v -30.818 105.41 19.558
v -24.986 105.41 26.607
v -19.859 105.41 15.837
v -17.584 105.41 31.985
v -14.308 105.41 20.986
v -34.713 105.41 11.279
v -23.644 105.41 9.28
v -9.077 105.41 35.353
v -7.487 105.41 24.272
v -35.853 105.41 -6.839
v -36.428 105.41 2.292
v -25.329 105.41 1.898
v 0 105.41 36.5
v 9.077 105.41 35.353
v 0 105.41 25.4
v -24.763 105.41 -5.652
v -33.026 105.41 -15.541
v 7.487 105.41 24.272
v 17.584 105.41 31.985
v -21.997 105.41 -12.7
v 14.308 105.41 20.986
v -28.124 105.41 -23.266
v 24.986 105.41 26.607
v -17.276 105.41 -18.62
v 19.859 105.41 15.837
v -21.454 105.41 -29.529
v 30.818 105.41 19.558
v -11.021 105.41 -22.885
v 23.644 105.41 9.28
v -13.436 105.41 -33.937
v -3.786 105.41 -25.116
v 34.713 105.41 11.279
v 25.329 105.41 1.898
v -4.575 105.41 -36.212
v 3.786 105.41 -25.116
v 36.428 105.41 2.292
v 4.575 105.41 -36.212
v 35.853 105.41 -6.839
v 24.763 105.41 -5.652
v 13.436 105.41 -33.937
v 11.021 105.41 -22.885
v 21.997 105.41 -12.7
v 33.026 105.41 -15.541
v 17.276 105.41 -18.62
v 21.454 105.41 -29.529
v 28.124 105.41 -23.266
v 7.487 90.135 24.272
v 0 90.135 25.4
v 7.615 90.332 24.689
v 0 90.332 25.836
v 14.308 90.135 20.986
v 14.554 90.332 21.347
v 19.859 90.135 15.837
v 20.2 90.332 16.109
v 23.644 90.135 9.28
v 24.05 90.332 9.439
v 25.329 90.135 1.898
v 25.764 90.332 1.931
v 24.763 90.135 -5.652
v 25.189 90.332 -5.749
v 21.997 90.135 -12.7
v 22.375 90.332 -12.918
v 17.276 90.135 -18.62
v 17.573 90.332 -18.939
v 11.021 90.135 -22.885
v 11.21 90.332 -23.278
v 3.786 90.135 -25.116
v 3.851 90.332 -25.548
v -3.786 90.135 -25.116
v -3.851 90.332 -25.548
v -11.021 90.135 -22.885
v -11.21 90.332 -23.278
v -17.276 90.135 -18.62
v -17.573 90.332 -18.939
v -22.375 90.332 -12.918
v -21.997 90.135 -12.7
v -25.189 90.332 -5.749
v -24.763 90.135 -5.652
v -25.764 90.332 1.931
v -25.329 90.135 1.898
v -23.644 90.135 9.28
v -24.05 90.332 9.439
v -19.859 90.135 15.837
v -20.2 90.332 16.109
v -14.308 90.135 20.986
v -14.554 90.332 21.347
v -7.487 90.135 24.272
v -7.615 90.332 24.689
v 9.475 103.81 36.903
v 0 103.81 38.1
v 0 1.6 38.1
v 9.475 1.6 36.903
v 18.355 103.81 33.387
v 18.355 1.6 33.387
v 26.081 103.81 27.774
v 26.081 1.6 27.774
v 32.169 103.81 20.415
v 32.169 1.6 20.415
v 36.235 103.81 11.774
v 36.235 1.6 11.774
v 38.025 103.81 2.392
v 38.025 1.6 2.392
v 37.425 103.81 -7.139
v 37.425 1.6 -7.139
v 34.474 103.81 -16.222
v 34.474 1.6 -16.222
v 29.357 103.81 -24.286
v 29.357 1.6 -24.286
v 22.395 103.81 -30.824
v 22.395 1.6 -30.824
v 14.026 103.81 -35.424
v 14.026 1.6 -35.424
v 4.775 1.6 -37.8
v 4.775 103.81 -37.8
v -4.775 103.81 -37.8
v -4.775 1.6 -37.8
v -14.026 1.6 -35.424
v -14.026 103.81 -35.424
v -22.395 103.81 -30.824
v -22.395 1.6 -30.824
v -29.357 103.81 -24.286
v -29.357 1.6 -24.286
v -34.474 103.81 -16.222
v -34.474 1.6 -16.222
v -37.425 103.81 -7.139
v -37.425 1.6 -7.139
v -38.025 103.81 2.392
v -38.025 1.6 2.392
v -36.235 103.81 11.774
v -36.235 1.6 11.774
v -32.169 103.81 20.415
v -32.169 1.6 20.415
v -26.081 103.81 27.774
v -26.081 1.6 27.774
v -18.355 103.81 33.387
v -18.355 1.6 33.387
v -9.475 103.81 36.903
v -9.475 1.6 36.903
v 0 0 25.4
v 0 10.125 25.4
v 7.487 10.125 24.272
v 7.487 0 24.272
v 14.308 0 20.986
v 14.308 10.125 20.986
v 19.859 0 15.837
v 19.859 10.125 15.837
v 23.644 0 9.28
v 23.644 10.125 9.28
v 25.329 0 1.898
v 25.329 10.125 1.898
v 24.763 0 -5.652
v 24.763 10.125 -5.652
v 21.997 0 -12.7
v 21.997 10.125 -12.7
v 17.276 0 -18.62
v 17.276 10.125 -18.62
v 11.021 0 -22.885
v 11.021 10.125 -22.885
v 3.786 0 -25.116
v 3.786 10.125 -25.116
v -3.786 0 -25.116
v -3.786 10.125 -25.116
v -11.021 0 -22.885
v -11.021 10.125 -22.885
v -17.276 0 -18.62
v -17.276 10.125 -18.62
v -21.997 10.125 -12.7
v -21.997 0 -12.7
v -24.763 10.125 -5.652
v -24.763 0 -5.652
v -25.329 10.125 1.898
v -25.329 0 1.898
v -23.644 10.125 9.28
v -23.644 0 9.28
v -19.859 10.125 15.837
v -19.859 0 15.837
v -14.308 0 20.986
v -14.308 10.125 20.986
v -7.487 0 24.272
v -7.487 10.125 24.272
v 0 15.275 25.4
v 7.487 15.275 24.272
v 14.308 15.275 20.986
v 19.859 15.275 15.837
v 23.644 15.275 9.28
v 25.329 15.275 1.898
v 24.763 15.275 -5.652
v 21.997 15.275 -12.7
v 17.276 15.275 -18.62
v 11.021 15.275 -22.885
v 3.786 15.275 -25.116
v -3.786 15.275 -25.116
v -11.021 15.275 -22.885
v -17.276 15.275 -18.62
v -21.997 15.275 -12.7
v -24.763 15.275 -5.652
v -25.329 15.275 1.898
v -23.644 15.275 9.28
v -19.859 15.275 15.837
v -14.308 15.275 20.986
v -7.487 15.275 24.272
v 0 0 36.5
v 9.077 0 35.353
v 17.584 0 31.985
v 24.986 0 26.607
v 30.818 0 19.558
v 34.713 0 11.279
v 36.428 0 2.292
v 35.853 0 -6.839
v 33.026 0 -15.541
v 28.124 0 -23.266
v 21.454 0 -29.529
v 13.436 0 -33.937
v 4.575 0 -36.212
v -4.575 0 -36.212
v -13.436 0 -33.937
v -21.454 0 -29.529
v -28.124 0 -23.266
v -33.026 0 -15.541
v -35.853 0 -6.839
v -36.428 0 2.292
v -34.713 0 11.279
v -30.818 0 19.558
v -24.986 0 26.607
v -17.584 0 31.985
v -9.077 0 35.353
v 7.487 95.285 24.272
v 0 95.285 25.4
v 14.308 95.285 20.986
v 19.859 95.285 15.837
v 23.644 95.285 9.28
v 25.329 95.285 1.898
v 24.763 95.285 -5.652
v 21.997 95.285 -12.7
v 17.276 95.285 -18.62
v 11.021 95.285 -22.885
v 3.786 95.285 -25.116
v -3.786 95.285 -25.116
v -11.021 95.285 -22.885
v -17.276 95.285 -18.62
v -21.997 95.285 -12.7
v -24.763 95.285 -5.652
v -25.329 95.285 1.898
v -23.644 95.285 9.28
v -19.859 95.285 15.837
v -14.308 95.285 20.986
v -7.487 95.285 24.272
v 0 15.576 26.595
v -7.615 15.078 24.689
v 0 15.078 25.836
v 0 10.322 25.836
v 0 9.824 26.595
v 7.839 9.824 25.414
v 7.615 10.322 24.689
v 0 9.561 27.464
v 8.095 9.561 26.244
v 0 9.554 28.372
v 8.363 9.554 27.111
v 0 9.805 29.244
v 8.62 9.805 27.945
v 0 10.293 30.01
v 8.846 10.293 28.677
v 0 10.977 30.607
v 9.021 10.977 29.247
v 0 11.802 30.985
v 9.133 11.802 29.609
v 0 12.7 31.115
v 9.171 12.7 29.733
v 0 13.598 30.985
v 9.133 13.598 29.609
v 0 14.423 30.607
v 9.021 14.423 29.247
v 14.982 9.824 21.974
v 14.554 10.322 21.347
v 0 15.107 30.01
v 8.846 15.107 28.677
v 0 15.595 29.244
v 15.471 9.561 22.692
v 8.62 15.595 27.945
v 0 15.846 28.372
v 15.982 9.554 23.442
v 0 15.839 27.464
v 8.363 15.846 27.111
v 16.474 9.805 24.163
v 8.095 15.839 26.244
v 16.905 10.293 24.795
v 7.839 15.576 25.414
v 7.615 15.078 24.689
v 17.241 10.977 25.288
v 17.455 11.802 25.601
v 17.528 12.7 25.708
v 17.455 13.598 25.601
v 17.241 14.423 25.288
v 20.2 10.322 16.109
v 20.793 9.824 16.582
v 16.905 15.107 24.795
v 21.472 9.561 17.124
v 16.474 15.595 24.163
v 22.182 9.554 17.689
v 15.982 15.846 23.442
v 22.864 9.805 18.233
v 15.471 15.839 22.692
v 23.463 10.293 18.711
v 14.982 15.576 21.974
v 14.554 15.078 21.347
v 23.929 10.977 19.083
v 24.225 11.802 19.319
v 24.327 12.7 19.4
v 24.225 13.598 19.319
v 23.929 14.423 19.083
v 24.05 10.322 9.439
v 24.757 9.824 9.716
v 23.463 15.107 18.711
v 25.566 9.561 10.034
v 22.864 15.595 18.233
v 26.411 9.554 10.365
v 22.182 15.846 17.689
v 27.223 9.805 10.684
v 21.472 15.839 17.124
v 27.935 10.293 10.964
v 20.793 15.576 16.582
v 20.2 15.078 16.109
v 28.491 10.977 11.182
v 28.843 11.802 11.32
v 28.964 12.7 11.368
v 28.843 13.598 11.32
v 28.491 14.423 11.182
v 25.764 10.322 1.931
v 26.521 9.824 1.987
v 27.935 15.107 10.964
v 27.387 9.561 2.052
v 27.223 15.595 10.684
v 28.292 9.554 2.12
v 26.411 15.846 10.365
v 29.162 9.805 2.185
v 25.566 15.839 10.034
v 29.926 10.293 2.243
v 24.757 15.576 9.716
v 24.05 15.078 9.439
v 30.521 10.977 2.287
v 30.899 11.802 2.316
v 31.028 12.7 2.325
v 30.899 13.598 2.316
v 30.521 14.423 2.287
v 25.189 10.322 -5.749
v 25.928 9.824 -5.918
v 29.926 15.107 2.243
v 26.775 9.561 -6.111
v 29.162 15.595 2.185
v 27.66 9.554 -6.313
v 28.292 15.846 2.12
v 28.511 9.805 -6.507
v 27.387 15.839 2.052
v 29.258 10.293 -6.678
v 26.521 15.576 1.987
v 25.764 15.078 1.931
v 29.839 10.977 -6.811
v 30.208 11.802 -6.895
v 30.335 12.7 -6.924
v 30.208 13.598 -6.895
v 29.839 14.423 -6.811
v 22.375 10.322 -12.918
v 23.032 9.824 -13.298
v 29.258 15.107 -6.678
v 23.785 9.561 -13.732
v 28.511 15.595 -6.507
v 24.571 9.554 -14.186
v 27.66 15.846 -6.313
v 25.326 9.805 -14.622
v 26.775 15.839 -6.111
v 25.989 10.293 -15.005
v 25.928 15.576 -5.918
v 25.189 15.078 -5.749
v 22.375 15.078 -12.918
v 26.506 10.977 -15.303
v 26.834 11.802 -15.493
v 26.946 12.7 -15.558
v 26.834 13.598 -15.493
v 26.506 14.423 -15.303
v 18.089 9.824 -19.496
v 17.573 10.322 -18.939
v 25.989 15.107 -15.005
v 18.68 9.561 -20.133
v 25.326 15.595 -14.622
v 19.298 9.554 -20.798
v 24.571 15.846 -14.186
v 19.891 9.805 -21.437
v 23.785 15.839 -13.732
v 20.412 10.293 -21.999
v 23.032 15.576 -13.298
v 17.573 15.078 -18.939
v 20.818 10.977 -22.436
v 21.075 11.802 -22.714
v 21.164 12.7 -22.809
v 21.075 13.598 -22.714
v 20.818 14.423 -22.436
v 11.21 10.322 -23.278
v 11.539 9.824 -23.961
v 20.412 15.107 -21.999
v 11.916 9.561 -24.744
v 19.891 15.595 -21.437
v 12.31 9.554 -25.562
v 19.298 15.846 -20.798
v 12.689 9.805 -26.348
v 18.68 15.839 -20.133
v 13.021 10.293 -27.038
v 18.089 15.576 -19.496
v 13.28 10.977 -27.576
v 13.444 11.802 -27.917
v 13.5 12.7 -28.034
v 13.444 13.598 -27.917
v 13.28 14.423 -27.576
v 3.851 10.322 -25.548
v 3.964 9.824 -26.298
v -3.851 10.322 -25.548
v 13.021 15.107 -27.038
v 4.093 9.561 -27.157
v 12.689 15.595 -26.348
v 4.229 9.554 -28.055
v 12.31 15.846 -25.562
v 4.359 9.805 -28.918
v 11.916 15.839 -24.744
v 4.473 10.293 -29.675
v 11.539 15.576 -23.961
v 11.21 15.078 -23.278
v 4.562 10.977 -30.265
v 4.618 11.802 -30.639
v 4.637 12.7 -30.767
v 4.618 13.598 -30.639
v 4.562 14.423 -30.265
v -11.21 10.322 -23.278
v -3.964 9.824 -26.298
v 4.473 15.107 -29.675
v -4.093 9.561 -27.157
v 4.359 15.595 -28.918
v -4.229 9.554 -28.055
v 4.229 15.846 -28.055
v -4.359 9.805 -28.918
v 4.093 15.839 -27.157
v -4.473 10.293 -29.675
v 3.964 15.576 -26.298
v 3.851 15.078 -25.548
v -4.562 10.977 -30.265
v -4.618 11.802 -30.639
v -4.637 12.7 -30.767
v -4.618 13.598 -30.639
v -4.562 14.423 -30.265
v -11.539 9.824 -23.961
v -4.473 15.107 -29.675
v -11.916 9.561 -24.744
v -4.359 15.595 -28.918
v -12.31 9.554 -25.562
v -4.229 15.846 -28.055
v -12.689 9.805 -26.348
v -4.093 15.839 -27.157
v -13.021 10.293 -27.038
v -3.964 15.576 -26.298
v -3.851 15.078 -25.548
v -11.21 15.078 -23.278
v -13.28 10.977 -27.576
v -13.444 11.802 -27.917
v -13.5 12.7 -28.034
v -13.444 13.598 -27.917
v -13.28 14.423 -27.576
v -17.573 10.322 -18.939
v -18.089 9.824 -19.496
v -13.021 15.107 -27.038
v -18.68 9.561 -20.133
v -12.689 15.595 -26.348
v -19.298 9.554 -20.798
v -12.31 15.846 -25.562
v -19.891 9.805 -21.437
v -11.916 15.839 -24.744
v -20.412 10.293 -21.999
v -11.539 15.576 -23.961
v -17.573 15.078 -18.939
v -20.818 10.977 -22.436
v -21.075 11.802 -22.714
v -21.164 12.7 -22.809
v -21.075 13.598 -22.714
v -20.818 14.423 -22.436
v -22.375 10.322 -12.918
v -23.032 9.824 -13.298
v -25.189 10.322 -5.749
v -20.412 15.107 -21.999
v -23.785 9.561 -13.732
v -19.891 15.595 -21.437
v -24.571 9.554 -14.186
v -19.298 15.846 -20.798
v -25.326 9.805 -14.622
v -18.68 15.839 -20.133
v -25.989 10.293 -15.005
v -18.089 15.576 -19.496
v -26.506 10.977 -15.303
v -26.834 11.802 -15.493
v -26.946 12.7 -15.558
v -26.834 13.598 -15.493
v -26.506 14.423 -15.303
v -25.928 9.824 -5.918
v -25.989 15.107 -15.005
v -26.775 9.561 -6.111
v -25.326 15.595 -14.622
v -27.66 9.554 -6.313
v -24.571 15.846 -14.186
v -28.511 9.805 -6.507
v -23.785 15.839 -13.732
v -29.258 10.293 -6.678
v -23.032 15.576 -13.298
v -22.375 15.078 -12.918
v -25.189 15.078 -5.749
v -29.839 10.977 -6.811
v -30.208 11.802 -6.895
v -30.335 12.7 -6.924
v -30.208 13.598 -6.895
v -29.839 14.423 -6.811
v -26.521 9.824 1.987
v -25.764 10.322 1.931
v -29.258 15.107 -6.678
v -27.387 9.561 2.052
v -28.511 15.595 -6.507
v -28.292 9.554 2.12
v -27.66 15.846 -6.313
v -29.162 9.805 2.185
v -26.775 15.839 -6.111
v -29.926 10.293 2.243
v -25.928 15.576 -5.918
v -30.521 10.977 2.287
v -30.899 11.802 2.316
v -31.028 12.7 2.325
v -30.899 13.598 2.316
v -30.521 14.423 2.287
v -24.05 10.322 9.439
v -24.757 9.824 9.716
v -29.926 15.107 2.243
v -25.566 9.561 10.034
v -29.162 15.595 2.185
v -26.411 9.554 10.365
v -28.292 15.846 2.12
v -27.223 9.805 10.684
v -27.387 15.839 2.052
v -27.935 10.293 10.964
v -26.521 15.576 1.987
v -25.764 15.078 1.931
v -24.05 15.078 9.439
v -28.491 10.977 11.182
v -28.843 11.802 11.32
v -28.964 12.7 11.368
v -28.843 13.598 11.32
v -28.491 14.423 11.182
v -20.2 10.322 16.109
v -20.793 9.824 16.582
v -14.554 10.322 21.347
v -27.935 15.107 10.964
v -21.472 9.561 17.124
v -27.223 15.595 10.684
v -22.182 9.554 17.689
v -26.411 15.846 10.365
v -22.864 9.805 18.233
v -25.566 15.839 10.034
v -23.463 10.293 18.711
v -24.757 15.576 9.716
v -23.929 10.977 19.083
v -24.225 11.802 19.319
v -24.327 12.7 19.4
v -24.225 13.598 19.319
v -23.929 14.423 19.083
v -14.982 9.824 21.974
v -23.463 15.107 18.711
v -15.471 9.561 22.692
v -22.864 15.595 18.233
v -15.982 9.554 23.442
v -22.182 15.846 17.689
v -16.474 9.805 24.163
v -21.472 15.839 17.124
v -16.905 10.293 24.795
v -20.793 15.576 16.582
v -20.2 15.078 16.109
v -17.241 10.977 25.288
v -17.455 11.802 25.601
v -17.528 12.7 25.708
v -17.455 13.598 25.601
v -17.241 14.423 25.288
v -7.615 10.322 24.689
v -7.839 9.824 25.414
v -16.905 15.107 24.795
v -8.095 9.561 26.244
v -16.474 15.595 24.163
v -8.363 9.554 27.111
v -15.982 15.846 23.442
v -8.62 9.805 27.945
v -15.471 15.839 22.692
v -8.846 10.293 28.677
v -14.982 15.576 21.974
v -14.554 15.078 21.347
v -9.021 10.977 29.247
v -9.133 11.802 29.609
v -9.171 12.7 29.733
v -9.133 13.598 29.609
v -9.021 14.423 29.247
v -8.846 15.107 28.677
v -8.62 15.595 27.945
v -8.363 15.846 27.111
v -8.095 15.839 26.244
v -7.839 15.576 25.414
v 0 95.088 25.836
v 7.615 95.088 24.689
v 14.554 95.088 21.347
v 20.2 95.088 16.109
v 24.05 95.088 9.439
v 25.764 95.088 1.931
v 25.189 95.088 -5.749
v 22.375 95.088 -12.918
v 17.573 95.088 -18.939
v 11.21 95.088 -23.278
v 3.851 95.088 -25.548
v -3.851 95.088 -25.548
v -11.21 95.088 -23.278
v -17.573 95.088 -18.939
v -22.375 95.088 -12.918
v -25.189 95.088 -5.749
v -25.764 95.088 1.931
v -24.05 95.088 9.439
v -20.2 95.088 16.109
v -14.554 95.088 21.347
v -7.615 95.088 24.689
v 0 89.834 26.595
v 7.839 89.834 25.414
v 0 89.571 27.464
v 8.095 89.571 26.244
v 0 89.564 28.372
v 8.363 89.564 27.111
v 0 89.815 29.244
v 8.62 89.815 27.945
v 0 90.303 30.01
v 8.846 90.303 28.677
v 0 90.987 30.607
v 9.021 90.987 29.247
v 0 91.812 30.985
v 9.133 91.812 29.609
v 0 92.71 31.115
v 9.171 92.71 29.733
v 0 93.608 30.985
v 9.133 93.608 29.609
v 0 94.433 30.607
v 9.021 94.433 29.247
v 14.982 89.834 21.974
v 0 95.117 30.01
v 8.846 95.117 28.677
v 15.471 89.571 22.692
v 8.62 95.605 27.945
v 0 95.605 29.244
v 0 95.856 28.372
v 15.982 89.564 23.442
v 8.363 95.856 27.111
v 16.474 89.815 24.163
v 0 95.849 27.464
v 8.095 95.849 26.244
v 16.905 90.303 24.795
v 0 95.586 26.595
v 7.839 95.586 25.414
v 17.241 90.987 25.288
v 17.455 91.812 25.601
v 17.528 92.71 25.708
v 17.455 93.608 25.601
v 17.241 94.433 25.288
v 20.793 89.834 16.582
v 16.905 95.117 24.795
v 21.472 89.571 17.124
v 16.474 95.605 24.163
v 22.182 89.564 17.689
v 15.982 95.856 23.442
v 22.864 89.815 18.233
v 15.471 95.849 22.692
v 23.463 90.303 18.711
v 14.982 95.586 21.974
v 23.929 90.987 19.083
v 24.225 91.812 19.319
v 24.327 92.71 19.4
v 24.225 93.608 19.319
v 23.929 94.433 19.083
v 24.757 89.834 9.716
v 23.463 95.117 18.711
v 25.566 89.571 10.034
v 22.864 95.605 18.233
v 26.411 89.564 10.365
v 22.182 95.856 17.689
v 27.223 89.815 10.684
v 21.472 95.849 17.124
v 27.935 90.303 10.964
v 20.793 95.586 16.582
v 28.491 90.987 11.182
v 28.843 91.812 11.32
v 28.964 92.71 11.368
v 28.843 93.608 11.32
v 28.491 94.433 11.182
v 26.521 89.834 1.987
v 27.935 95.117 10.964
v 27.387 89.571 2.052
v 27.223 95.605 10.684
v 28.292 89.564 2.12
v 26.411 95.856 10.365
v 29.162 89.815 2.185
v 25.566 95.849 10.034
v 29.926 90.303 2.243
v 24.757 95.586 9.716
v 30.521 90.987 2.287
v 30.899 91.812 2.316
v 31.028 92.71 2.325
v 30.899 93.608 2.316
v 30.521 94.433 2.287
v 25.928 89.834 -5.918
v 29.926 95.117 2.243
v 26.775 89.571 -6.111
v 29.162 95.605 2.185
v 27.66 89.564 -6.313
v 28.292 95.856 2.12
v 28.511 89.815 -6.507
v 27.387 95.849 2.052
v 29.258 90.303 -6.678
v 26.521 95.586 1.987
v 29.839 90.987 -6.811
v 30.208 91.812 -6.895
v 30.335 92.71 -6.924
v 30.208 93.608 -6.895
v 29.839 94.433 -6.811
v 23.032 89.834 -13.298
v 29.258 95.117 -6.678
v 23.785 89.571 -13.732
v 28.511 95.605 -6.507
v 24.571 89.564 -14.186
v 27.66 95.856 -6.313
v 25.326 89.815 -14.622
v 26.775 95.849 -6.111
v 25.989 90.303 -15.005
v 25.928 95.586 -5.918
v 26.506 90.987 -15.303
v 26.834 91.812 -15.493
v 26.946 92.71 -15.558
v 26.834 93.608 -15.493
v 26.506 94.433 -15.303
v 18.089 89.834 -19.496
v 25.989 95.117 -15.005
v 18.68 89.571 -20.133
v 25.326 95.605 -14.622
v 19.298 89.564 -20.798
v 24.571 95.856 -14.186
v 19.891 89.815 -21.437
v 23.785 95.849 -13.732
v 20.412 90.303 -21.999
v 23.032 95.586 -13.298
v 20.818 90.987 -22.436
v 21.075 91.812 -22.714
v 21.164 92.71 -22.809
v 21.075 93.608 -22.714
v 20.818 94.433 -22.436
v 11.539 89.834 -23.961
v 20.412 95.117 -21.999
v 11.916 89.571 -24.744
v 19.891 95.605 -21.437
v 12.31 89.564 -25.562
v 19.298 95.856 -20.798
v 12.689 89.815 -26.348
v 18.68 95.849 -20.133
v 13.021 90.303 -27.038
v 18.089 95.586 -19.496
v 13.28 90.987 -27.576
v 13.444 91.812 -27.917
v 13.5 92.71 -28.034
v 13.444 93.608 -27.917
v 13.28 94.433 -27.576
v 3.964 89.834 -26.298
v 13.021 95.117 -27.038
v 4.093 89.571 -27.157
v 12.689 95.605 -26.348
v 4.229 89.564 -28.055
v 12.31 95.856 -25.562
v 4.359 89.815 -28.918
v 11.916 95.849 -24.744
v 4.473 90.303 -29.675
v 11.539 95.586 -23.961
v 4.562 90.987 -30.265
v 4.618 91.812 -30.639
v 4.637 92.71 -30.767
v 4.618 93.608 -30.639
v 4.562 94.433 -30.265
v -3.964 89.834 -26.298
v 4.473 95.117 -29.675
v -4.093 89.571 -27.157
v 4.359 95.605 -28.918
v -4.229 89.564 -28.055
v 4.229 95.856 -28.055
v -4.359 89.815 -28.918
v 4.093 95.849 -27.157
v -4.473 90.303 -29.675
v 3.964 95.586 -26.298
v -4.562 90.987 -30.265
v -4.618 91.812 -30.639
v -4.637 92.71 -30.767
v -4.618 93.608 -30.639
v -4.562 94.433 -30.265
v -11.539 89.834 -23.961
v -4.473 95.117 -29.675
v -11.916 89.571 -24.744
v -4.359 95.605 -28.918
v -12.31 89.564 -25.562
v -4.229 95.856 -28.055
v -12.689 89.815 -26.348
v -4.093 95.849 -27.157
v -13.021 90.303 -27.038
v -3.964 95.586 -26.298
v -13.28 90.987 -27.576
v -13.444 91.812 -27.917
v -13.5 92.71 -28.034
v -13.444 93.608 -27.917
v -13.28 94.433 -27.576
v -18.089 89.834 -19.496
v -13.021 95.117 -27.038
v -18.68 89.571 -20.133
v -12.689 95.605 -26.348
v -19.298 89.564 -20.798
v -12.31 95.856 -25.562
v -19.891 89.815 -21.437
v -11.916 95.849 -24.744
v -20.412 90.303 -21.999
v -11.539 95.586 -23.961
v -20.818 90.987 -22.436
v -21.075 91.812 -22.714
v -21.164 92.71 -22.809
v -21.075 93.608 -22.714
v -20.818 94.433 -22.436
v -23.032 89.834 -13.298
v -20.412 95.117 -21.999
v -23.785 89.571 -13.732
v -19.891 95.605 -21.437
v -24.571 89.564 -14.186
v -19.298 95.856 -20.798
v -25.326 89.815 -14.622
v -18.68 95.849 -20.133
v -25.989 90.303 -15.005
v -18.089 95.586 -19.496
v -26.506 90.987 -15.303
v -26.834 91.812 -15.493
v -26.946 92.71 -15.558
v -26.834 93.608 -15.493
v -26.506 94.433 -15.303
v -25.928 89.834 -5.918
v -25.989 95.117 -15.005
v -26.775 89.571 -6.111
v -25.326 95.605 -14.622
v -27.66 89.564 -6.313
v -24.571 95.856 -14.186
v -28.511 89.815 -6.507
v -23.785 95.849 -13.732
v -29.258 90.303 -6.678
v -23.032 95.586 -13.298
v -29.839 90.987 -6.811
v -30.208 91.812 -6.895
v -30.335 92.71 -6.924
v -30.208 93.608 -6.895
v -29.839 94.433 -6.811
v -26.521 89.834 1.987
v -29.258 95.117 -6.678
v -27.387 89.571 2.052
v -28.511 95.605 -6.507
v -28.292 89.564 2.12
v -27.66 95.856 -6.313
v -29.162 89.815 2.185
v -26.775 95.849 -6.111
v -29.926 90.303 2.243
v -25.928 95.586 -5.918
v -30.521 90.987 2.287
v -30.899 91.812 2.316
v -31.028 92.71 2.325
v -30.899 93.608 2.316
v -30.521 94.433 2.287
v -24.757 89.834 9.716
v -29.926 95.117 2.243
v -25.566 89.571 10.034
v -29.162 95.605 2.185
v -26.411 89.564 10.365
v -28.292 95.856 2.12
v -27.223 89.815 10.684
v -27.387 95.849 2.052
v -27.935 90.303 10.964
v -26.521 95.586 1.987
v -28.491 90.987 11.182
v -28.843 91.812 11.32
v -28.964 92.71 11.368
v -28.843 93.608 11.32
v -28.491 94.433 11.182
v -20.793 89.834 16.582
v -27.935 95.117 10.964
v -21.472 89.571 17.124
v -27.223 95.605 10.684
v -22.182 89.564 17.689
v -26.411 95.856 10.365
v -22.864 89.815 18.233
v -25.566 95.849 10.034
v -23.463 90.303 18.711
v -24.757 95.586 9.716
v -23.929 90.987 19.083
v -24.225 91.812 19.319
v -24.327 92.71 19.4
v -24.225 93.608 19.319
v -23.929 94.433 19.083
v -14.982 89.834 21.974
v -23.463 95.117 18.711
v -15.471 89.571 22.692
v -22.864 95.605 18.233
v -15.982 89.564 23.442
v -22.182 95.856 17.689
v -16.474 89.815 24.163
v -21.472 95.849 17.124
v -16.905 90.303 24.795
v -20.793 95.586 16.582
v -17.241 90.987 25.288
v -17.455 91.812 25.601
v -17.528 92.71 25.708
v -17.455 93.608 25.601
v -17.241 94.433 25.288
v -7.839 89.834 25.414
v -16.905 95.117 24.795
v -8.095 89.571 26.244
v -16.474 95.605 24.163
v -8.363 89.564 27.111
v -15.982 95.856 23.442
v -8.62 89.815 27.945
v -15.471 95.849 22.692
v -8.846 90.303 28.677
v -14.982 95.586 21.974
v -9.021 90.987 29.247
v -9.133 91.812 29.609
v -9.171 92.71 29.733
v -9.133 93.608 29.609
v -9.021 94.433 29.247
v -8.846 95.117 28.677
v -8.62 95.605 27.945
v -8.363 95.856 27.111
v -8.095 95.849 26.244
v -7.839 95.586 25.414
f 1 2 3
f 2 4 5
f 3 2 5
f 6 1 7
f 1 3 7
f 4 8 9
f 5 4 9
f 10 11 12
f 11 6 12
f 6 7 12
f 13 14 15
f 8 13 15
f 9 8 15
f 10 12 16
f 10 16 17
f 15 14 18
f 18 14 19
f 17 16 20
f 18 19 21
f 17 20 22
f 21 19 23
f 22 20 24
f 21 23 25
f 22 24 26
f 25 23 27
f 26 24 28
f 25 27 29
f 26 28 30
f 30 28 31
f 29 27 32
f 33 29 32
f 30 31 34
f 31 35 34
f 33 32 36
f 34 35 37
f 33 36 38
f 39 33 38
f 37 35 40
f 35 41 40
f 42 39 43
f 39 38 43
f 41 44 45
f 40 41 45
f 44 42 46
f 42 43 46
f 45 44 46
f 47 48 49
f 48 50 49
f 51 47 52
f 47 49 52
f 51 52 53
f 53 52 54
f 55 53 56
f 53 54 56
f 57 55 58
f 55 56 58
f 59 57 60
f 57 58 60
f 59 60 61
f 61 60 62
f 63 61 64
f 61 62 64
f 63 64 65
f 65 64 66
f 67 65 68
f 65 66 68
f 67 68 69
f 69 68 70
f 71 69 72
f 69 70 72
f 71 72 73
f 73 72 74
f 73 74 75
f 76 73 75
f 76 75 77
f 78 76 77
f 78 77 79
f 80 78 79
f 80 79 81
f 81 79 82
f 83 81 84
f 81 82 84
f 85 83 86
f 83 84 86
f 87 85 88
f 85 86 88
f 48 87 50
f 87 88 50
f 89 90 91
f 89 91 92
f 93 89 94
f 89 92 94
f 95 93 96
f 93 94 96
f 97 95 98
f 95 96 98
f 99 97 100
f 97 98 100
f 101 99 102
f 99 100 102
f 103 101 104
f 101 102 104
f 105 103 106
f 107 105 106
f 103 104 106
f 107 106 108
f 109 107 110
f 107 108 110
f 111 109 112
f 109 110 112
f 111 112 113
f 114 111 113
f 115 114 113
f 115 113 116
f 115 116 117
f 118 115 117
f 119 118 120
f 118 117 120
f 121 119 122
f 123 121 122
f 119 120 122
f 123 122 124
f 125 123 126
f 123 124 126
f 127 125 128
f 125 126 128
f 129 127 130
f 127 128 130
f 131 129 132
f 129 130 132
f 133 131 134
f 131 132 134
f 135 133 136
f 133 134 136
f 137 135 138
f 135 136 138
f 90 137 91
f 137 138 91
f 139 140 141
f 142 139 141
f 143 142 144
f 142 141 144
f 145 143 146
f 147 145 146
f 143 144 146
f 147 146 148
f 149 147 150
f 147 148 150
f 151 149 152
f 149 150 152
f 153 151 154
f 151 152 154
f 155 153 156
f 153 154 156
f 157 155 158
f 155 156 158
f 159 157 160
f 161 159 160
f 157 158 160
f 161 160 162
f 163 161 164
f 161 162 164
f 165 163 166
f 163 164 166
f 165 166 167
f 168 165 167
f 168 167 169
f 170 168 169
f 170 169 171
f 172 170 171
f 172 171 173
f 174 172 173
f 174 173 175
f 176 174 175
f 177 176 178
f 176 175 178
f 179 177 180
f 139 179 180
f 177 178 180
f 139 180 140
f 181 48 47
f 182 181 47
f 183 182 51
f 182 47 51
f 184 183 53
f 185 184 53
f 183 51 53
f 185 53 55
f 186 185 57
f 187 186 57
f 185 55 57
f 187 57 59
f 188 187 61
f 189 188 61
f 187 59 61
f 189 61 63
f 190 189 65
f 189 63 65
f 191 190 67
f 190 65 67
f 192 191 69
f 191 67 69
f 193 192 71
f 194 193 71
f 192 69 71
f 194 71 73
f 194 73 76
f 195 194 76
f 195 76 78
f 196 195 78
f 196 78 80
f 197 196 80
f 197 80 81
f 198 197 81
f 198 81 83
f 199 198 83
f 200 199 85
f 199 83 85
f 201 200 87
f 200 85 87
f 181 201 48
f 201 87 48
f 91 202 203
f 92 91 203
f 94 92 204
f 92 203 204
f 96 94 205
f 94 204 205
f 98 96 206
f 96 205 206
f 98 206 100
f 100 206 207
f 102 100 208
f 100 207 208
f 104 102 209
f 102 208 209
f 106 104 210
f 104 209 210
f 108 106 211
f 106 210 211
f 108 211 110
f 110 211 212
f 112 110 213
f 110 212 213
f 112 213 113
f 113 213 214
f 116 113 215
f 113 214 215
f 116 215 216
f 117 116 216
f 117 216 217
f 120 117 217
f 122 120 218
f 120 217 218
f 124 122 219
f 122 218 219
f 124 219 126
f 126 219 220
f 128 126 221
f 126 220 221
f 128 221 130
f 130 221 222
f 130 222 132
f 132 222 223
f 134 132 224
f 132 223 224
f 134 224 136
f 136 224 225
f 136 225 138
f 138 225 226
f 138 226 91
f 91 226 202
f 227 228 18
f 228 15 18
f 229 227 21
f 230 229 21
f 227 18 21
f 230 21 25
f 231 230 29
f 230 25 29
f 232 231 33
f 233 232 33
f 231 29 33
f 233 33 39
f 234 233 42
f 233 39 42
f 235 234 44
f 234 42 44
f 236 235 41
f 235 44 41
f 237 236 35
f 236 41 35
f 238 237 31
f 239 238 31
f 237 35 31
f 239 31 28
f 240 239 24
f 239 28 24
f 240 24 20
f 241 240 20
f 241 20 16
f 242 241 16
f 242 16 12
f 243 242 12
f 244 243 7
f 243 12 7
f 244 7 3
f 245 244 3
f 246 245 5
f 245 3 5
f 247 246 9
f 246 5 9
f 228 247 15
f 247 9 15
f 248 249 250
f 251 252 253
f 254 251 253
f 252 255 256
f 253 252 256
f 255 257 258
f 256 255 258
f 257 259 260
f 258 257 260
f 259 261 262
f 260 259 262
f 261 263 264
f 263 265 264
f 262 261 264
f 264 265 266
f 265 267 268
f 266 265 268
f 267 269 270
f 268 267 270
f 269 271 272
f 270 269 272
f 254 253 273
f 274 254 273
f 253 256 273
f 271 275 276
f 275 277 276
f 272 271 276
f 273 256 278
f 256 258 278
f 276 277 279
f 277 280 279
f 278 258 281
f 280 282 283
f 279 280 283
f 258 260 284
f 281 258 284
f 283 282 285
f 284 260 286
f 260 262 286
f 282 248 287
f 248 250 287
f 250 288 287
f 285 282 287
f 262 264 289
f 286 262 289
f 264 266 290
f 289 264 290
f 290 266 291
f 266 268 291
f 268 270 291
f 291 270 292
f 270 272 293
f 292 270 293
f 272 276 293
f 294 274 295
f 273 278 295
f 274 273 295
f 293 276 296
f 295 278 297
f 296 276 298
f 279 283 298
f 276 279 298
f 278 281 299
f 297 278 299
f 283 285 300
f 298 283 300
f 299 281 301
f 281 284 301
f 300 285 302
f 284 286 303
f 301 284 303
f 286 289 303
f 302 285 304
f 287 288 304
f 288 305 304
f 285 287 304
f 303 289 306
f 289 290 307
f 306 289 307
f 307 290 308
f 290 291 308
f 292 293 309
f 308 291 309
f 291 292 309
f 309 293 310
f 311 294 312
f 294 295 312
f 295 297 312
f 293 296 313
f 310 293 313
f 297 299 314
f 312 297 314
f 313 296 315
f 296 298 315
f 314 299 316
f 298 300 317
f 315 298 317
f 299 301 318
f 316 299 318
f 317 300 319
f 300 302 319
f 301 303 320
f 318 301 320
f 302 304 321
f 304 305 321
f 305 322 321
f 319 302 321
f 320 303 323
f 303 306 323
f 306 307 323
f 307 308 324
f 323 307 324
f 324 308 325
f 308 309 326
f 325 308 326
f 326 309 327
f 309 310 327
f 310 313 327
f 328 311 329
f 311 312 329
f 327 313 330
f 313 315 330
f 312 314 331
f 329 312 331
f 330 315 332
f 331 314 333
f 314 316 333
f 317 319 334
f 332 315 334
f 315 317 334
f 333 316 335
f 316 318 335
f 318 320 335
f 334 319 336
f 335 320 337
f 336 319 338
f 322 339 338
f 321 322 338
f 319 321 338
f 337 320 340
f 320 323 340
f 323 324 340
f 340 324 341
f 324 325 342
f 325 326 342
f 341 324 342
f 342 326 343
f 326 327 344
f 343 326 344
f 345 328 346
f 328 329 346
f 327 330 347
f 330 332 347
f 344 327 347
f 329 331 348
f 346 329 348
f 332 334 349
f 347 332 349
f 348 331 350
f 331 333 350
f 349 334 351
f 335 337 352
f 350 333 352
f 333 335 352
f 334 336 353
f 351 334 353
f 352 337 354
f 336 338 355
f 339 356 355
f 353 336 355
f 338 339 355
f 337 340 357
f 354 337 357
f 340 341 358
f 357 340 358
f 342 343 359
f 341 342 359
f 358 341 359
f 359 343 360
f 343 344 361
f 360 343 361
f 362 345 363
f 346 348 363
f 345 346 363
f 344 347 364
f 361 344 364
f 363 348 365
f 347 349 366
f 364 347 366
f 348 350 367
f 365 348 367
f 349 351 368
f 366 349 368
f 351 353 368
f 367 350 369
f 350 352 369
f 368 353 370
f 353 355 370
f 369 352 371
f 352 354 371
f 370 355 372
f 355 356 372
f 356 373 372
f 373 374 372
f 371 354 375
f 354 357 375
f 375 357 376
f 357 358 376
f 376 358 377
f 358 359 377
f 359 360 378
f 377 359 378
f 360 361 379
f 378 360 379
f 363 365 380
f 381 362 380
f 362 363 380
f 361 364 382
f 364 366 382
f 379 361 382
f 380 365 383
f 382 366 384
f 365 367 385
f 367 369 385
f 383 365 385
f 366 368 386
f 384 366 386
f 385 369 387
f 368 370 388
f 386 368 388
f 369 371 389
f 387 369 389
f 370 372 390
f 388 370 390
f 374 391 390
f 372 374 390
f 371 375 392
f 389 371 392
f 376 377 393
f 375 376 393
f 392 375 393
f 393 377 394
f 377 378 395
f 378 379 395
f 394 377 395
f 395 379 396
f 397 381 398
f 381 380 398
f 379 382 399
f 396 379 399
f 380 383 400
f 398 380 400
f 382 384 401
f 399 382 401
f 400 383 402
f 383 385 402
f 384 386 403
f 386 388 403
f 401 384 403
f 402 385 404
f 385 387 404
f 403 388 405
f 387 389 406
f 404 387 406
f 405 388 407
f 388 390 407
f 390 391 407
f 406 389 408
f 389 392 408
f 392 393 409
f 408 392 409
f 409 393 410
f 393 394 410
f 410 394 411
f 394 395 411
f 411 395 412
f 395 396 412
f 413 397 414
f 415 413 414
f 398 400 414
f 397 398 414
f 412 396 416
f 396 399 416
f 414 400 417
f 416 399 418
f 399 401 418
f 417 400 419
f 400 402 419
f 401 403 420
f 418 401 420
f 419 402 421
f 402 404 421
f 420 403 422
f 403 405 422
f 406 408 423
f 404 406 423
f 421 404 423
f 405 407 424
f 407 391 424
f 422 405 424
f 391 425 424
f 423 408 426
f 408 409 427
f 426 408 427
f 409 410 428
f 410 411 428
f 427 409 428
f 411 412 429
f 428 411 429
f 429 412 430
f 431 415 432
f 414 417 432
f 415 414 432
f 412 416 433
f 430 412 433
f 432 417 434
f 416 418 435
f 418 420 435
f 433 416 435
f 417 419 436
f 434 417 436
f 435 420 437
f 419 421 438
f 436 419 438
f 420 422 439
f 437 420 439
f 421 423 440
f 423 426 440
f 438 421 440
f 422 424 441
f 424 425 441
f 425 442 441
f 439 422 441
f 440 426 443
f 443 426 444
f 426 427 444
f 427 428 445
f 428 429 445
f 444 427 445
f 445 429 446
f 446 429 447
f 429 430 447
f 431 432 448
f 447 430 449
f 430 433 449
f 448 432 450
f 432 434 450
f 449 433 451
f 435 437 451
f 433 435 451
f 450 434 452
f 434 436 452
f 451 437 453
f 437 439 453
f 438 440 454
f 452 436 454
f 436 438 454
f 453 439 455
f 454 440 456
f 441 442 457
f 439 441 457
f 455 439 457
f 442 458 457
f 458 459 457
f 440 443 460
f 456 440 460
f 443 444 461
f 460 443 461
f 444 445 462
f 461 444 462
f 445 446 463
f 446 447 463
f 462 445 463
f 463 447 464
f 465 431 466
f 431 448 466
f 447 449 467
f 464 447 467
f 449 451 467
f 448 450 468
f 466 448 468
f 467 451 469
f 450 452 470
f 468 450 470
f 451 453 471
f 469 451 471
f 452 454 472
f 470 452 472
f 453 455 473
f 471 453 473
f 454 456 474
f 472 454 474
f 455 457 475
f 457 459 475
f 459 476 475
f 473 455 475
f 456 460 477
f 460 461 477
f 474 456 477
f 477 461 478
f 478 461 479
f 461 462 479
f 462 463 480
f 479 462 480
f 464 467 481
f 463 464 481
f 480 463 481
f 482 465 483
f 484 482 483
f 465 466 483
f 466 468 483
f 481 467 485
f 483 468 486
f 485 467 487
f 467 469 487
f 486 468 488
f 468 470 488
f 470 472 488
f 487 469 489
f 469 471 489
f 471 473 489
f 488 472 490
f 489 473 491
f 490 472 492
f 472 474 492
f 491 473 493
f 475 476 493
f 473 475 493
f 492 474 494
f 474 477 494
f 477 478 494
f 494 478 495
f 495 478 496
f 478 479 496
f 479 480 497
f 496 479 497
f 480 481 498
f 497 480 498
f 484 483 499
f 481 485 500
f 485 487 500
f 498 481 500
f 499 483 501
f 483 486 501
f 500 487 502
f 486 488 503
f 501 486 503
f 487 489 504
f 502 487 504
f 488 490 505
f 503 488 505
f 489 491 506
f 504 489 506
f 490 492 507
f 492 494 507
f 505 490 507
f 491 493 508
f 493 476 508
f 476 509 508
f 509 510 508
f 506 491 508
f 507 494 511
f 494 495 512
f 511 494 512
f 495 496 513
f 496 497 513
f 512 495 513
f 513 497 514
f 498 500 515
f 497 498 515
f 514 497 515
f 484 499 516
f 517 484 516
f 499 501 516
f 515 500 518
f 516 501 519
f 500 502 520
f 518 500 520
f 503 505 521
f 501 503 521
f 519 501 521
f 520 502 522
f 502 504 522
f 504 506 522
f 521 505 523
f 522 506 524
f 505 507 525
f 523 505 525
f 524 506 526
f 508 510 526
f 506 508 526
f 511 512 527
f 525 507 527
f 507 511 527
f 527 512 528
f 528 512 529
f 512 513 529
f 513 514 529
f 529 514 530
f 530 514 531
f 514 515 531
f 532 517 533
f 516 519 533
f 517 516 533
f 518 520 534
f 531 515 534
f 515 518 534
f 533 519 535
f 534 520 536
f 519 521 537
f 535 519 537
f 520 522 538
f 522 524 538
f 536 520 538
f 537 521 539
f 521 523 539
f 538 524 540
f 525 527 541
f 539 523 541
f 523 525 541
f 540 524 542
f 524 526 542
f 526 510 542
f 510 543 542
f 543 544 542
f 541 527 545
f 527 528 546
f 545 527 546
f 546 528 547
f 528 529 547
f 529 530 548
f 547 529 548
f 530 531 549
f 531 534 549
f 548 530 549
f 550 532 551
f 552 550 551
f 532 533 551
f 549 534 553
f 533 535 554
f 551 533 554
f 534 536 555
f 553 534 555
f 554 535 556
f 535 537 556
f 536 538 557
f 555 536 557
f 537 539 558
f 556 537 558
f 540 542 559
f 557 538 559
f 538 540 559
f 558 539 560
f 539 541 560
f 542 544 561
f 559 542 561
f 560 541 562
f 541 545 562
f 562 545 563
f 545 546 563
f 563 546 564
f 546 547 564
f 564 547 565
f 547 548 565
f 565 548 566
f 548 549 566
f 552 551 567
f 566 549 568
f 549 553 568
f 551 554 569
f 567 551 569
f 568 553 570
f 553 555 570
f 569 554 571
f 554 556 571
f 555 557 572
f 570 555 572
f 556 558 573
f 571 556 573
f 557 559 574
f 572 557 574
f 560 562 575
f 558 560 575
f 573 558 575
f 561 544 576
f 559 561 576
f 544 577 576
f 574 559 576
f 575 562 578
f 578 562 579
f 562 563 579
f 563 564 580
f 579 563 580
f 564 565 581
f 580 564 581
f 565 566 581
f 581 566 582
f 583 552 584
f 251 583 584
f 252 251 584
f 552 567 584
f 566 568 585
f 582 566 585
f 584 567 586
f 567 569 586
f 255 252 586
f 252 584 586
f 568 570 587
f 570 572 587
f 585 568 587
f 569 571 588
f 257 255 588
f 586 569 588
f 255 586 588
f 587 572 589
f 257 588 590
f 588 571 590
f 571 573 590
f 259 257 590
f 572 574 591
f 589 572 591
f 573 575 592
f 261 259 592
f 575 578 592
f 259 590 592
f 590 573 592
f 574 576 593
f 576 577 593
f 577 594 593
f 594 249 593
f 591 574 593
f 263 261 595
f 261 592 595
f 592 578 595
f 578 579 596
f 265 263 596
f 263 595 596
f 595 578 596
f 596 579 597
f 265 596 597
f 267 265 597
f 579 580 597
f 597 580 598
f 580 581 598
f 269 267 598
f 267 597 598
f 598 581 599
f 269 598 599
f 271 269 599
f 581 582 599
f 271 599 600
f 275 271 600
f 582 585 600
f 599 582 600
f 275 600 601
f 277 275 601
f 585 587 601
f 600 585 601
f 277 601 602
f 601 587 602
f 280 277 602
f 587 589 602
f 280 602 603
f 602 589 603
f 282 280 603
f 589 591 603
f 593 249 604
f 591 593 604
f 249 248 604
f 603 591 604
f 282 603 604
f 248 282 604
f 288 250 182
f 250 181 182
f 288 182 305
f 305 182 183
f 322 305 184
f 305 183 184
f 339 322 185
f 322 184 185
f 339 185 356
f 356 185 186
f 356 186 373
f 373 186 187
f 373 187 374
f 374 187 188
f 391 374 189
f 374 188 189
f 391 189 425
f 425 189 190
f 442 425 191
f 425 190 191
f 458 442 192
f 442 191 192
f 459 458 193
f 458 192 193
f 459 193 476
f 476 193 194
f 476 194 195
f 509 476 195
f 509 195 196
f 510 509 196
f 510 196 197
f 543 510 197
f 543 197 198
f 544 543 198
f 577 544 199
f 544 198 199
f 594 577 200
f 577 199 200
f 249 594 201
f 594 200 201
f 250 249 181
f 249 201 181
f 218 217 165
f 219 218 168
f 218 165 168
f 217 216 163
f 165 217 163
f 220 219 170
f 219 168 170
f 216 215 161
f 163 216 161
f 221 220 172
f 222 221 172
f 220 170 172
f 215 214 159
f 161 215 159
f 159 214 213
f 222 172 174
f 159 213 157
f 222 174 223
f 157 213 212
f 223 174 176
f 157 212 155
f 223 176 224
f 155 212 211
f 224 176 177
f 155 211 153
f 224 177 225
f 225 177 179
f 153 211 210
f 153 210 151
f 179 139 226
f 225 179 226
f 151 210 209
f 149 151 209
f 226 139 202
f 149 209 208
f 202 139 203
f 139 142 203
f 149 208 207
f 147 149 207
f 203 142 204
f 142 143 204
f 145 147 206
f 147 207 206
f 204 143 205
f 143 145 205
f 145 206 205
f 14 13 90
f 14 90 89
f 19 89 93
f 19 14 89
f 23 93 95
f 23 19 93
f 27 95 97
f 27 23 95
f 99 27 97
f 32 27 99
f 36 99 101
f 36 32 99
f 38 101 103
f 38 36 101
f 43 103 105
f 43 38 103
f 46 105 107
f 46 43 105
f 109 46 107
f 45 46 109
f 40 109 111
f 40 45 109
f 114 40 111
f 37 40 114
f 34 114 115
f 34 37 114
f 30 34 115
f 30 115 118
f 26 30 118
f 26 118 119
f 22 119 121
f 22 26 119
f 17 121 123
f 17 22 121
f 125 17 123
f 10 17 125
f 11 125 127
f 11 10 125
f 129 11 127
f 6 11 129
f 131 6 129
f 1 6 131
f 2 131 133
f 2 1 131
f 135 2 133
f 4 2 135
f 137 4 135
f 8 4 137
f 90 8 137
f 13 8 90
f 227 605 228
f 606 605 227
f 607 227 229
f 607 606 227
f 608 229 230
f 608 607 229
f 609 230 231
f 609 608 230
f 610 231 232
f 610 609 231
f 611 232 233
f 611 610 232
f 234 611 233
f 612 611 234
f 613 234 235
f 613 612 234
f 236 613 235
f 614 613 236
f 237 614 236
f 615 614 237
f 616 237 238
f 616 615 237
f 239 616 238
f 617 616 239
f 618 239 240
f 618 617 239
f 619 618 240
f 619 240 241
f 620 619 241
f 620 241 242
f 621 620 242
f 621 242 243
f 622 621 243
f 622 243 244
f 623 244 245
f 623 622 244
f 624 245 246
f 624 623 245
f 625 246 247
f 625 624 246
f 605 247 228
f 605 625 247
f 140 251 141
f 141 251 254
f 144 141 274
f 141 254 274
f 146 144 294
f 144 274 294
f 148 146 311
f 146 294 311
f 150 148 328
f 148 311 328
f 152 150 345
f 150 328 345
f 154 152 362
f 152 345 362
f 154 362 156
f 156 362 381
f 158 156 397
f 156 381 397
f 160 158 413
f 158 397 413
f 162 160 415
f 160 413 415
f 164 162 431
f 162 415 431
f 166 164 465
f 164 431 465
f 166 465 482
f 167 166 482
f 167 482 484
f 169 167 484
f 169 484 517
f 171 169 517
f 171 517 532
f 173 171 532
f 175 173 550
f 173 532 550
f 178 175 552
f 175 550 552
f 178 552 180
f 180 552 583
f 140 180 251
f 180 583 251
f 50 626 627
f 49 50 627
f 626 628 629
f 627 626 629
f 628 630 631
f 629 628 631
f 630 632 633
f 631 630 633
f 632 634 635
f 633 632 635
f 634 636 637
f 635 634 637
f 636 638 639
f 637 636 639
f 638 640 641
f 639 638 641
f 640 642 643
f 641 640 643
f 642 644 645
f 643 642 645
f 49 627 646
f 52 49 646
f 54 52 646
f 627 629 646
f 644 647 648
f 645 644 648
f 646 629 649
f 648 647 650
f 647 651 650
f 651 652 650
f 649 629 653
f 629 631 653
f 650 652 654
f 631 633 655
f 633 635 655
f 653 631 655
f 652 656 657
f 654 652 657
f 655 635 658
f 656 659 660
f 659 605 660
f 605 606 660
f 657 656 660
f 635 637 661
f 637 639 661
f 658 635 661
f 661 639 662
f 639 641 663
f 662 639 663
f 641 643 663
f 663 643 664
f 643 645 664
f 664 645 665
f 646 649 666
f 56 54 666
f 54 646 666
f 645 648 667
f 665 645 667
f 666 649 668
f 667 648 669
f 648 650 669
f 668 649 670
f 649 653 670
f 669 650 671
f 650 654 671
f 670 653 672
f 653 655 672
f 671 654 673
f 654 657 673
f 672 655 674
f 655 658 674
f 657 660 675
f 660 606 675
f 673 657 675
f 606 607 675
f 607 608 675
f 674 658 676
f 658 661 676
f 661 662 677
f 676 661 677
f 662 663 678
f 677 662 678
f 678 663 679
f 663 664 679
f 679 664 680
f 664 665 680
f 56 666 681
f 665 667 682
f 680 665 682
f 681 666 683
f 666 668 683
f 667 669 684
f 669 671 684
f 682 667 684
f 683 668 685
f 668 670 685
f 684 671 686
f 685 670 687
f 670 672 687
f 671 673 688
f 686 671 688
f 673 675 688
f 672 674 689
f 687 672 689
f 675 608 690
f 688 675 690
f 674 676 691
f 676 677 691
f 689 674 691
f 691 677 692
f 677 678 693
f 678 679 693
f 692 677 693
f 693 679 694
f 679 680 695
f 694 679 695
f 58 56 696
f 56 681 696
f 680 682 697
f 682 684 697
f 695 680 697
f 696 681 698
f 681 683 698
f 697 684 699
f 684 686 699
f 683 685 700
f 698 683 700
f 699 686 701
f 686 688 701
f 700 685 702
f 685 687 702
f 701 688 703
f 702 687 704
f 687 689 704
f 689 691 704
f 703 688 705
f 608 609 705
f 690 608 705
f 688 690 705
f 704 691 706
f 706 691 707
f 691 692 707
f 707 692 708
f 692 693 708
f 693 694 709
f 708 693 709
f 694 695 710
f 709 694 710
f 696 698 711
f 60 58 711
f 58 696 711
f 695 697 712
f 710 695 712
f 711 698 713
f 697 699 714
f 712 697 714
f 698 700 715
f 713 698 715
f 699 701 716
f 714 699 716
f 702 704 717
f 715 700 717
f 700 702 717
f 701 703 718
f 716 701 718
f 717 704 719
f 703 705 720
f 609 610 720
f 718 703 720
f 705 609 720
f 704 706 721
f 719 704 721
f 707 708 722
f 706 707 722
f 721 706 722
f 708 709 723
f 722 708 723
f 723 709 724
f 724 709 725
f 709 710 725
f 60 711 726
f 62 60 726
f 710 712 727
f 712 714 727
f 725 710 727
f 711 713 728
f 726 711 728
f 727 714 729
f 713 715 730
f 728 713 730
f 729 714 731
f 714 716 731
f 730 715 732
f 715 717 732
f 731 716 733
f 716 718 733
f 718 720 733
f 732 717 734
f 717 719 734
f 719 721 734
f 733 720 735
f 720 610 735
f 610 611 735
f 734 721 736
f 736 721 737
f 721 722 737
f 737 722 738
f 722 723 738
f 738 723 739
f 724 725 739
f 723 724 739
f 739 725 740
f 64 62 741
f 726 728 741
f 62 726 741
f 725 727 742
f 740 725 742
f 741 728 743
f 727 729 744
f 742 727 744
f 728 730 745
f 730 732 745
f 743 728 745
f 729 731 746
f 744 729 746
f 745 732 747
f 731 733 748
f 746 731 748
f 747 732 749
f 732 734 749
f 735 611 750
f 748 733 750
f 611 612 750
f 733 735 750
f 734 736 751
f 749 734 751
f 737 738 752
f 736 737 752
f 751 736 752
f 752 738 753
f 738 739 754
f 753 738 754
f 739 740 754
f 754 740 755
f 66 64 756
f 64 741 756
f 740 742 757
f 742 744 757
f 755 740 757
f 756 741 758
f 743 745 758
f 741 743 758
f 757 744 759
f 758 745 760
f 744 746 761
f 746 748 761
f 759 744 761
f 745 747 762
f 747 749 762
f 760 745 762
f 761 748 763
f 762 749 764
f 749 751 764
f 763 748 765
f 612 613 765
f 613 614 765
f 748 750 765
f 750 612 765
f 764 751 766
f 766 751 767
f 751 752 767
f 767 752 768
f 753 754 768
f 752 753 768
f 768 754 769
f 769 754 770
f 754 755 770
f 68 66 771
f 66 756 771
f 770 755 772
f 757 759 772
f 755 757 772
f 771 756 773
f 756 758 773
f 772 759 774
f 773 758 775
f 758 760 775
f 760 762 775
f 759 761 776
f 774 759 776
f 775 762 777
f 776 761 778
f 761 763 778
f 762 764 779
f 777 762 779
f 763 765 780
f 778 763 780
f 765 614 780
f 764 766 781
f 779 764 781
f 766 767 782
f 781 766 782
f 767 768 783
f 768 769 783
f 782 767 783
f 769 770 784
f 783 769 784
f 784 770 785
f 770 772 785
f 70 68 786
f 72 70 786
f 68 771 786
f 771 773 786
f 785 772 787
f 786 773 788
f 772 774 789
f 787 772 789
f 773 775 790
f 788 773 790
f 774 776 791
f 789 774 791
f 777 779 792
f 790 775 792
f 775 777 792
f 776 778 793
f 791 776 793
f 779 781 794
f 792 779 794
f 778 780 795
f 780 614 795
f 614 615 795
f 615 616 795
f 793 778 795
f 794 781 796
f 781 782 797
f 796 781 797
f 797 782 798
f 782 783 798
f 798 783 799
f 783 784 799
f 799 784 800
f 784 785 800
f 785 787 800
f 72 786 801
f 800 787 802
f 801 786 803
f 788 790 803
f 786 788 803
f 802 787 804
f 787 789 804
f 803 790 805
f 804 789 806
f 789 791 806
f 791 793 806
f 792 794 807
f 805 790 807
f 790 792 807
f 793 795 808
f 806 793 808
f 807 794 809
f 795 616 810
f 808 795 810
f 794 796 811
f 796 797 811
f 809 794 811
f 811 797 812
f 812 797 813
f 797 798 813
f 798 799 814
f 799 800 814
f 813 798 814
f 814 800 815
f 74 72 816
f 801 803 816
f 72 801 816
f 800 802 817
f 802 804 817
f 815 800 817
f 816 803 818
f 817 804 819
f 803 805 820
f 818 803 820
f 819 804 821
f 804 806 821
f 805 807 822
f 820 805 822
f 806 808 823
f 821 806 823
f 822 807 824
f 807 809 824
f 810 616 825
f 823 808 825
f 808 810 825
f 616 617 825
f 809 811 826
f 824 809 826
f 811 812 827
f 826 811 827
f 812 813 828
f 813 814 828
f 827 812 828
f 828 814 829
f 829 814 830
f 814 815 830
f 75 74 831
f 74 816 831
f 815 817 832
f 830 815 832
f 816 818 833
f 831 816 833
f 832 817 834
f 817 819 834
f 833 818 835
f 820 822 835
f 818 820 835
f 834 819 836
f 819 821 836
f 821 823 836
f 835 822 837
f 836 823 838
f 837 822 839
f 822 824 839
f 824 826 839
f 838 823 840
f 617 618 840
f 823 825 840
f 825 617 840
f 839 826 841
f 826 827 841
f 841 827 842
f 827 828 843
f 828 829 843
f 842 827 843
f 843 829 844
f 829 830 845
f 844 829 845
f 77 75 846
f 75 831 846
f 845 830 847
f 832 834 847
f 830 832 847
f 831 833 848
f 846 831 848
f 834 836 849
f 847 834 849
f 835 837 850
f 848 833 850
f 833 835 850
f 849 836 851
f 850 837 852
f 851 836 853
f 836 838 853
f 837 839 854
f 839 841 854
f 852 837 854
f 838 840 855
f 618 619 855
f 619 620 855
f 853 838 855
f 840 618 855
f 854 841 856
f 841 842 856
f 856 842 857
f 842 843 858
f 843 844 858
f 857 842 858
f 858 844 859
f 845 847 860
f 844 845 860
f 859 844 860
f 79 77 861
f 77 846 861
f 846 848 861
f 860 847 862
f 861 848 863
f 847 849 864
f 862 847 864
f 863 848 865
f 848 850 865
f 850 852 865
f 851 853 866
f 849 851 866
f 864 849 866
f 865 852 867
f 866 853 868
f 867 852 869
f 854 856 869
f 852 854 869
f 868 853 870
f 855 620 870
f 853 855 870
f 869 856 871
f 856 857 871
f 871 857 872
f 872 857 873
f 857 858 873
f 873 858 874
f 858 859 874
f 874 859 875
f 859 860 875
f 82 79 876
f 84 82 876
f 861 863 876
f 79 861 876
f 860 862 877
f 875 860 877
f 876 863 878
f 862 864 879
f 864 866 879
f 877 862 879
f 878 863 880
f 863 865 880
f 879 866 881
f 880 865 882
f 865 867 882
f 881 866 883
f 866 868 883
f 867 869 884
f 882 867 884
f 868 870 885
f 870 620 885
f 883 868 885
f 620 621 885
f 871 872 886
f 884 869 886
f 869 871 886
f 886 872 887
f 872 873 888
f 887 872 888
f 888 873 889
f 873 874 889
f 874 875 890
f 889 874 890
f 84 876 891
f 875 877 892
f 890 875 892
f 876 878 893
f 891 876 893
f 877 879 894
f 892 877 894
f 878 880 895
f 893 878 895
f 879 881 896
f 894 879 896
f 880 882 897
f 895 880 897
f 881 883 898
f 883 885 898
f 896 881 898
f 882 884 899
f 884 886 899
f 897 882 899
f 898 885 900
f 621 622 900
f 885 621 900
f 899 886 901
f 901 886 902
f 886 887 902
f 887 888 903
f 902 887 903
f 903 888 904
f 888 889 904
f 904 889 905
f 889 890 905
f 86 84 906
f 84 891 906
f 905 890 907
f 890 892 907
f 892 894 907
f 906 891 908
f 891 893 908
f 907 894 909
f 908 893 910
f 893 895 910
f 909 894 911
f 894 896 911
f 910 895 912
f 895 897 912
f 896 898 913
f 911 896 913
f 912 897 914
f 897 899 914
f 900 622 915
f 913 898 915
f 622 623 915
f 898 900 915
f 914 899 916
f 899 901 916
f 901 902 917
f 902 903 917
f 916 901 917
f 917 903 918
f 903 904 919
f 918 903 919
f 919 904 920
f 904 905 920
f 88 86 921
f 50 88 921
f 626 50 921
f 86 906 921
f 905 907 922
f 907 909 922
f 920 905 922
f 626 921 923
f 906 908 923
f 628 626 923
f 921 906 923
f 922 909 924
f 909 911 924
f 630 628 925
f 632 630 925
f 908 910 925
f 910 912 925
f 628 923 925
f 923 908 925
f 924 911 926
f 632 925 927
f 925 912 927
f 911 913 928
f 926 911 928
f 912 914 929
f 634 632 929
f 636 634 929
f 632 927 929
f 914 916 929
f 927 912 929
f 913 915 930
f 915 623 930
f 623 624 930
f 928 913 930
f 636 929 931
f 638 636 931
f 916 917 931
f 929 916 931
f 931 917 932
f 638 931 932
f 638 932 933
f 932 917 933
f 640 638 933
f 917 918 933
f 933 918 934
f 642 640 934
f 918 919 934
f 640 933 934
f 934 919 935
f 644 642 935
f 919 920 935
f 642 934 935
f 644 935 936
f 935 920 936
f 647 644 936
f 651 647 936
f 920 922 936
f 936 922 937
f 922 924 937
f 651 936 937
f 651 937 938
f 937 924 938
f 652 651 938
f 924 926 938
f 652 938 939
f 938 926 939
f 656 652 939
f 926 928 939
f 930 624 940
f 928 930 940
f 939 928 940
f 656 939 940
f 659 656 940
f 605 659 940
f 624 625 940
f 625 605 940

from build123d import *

# Parameters (mm, degrees)
F3_SIZE = 1.6002


# Not quite as in the source:
# - a fillet or chamfer that OpenCascade refuses, or shapes differently, is made with other operations: its cross-section is extruded or revolved along the edge and cut away or added


with BuildPart() as f1:
    # F0 (on Right) → F1 (revolve)
    with BuildSketch(Plane.YZ):
        with BuildLine():
            Line((105.41, 38.1), (0, 38.1))
            Line((0, 38.1), (0, 25.4))
            Line((0, 25.4), (10.795, 25.4))
            ThreePointArc((10.795, 25.4), (12.7, 31.115), (14.605, 25.4))
            Line((14.605, 25.4), (90.805, 25.4))
            ThreePointArc((90.805, 25.4), (92.71, 31.115), (94.615, 25.4))
            Line((94.615, 25.4), (105.41, 25.4))
            Line((105.41, 25.4), (105.41, 38.1))
        make_face()
    revolve(axis=Axis((0, 63.5, 0), (0, 1, 0)))

    # F2: chamfer of 0.7874 on 6 edges, made by hand

    # F2_s1 → F2_t2 (revolve, cut)
    with BuildSketch(Plane.YZ):
        with BuildLine():
            Line((10.1123747416, 25.3712836476), (10.3348384737, 25.8650833474))
            Line((10.3348384737, 25.8650833474), (10.346633843, 25.8755173671))
            ThreePointArc((10.346633843, 25.8755173671), (10.5543660431, 25.6211364589), (10.8044488, 25.4125984))
            Line((10.8044488, 25.4125984), (10.795, 25.384252))
            ThreePointArc((10.795, 25.384252), (10.4536873708, 25.384252), (10.1123747416, 25.3555356476))
            Line((10.1123747416, 25.3555356476), (10.1123747416, 25.3712836476))
        make_face()
    revolve(axis=Axis((0, 10.795, 0), (0, 1, 0)), mode=Mode.SUBTRACT)

    # F2_s3 → F2_t4 (revolve, cut)
    with BuildSketch(Plane.YZ):
        with BuildLine():
            Line((15.0651615263, 25.8650833474), (15.2876252584, 25.3712836476))
            Line((15.2876252584, 25.3712836476), (15.2876252584, 25.3555356476))
            ThreePointArc((15.2876252584, 25.3555356476), (14.9463126292, 25.384252), (14.605, 25.384252))
            Line((14.605, 25.384252), (14.5955512, 25.4125984))
            ThreePointArc((14.5955512, 25.4125984), (14.8456339569, 25.6211364589), (15.053366157, 25.8755173671))
            Line((15.053366157, 25.8755173671), (15.0651615263, 25.8650833474))
        make_face()
    revolve(axis=Axis((0, 14.605, 0), (0, 1, 0)), mode=Mode.SUBTRACT)

    # F2_s5 → F2_t6 (revolve, cut)
    with BuildSketch(Plane.YZ):
        with BuildLine():
            Line((90.1223747416, 25.3712836476), (90.3448384737, 25.8650833474))
            Line((90.3448384737, 25.8650833474), (90.356633843, 25.8755173671))
            ThreePointArc((90.356633843, 25.8755173671), (90.5643660431, 25.6211364589), (90.8144488, 25.4125984))
            Line((90.8144488, 25.4125984), (90.805, 25.384252))
            ThreePointArc((90.805, 25.384252), (90.4636873708, 25.384252), (90.1223747416, 25.3555356476))
            Line((90.1223747416, 25.3555356476), (90.1223747416, 25.3712836476))
        make_face()
    revolve(axis=Axis((0, 90.805, 0), (0, 1, 0)), mode=Mode.SUBTRACT)

    # F2_s7 → F2_t8 (revolve, cut)
    with BuildSketch(Plane.YZ):
        with BuildLine():
            Line((95.2976252584, 25.3712836476), (95.0751615263, 25.8650833474))
            Line((95.0751615263, 25.8650833474), (95.063366157, 25.8755173671))
            ThreePointArc((95.063366157, 25.8755173671), (94.8556339569, 25.6211364589), (94.6055512, 25.4125984))
            Line((94.6055512, 25.4125984), (94.615, 25.384252))
            ThreePointArc((94.615, 25.384252), (94.9563126292, 25.384252), (95.2976252584, 25.3555356476))
            Line((95.2976252584, 25.3555356476), (95.2976252584, 25.3712836476))
        make_face()
    revolve(axis=Axis((0, 94.615, 0), (0, 1, 0)), mode=Mode.SUBTRACT)

    # F3
    f3_edges = [f1.edges().sort_by_distance(p)[0] for p in [
        (0, 105.41, -38.1),
        (0, 0, -38.1),
    ]]
    chamfer(f3_edges, length=F3_SIZE)


solid = f1.part
